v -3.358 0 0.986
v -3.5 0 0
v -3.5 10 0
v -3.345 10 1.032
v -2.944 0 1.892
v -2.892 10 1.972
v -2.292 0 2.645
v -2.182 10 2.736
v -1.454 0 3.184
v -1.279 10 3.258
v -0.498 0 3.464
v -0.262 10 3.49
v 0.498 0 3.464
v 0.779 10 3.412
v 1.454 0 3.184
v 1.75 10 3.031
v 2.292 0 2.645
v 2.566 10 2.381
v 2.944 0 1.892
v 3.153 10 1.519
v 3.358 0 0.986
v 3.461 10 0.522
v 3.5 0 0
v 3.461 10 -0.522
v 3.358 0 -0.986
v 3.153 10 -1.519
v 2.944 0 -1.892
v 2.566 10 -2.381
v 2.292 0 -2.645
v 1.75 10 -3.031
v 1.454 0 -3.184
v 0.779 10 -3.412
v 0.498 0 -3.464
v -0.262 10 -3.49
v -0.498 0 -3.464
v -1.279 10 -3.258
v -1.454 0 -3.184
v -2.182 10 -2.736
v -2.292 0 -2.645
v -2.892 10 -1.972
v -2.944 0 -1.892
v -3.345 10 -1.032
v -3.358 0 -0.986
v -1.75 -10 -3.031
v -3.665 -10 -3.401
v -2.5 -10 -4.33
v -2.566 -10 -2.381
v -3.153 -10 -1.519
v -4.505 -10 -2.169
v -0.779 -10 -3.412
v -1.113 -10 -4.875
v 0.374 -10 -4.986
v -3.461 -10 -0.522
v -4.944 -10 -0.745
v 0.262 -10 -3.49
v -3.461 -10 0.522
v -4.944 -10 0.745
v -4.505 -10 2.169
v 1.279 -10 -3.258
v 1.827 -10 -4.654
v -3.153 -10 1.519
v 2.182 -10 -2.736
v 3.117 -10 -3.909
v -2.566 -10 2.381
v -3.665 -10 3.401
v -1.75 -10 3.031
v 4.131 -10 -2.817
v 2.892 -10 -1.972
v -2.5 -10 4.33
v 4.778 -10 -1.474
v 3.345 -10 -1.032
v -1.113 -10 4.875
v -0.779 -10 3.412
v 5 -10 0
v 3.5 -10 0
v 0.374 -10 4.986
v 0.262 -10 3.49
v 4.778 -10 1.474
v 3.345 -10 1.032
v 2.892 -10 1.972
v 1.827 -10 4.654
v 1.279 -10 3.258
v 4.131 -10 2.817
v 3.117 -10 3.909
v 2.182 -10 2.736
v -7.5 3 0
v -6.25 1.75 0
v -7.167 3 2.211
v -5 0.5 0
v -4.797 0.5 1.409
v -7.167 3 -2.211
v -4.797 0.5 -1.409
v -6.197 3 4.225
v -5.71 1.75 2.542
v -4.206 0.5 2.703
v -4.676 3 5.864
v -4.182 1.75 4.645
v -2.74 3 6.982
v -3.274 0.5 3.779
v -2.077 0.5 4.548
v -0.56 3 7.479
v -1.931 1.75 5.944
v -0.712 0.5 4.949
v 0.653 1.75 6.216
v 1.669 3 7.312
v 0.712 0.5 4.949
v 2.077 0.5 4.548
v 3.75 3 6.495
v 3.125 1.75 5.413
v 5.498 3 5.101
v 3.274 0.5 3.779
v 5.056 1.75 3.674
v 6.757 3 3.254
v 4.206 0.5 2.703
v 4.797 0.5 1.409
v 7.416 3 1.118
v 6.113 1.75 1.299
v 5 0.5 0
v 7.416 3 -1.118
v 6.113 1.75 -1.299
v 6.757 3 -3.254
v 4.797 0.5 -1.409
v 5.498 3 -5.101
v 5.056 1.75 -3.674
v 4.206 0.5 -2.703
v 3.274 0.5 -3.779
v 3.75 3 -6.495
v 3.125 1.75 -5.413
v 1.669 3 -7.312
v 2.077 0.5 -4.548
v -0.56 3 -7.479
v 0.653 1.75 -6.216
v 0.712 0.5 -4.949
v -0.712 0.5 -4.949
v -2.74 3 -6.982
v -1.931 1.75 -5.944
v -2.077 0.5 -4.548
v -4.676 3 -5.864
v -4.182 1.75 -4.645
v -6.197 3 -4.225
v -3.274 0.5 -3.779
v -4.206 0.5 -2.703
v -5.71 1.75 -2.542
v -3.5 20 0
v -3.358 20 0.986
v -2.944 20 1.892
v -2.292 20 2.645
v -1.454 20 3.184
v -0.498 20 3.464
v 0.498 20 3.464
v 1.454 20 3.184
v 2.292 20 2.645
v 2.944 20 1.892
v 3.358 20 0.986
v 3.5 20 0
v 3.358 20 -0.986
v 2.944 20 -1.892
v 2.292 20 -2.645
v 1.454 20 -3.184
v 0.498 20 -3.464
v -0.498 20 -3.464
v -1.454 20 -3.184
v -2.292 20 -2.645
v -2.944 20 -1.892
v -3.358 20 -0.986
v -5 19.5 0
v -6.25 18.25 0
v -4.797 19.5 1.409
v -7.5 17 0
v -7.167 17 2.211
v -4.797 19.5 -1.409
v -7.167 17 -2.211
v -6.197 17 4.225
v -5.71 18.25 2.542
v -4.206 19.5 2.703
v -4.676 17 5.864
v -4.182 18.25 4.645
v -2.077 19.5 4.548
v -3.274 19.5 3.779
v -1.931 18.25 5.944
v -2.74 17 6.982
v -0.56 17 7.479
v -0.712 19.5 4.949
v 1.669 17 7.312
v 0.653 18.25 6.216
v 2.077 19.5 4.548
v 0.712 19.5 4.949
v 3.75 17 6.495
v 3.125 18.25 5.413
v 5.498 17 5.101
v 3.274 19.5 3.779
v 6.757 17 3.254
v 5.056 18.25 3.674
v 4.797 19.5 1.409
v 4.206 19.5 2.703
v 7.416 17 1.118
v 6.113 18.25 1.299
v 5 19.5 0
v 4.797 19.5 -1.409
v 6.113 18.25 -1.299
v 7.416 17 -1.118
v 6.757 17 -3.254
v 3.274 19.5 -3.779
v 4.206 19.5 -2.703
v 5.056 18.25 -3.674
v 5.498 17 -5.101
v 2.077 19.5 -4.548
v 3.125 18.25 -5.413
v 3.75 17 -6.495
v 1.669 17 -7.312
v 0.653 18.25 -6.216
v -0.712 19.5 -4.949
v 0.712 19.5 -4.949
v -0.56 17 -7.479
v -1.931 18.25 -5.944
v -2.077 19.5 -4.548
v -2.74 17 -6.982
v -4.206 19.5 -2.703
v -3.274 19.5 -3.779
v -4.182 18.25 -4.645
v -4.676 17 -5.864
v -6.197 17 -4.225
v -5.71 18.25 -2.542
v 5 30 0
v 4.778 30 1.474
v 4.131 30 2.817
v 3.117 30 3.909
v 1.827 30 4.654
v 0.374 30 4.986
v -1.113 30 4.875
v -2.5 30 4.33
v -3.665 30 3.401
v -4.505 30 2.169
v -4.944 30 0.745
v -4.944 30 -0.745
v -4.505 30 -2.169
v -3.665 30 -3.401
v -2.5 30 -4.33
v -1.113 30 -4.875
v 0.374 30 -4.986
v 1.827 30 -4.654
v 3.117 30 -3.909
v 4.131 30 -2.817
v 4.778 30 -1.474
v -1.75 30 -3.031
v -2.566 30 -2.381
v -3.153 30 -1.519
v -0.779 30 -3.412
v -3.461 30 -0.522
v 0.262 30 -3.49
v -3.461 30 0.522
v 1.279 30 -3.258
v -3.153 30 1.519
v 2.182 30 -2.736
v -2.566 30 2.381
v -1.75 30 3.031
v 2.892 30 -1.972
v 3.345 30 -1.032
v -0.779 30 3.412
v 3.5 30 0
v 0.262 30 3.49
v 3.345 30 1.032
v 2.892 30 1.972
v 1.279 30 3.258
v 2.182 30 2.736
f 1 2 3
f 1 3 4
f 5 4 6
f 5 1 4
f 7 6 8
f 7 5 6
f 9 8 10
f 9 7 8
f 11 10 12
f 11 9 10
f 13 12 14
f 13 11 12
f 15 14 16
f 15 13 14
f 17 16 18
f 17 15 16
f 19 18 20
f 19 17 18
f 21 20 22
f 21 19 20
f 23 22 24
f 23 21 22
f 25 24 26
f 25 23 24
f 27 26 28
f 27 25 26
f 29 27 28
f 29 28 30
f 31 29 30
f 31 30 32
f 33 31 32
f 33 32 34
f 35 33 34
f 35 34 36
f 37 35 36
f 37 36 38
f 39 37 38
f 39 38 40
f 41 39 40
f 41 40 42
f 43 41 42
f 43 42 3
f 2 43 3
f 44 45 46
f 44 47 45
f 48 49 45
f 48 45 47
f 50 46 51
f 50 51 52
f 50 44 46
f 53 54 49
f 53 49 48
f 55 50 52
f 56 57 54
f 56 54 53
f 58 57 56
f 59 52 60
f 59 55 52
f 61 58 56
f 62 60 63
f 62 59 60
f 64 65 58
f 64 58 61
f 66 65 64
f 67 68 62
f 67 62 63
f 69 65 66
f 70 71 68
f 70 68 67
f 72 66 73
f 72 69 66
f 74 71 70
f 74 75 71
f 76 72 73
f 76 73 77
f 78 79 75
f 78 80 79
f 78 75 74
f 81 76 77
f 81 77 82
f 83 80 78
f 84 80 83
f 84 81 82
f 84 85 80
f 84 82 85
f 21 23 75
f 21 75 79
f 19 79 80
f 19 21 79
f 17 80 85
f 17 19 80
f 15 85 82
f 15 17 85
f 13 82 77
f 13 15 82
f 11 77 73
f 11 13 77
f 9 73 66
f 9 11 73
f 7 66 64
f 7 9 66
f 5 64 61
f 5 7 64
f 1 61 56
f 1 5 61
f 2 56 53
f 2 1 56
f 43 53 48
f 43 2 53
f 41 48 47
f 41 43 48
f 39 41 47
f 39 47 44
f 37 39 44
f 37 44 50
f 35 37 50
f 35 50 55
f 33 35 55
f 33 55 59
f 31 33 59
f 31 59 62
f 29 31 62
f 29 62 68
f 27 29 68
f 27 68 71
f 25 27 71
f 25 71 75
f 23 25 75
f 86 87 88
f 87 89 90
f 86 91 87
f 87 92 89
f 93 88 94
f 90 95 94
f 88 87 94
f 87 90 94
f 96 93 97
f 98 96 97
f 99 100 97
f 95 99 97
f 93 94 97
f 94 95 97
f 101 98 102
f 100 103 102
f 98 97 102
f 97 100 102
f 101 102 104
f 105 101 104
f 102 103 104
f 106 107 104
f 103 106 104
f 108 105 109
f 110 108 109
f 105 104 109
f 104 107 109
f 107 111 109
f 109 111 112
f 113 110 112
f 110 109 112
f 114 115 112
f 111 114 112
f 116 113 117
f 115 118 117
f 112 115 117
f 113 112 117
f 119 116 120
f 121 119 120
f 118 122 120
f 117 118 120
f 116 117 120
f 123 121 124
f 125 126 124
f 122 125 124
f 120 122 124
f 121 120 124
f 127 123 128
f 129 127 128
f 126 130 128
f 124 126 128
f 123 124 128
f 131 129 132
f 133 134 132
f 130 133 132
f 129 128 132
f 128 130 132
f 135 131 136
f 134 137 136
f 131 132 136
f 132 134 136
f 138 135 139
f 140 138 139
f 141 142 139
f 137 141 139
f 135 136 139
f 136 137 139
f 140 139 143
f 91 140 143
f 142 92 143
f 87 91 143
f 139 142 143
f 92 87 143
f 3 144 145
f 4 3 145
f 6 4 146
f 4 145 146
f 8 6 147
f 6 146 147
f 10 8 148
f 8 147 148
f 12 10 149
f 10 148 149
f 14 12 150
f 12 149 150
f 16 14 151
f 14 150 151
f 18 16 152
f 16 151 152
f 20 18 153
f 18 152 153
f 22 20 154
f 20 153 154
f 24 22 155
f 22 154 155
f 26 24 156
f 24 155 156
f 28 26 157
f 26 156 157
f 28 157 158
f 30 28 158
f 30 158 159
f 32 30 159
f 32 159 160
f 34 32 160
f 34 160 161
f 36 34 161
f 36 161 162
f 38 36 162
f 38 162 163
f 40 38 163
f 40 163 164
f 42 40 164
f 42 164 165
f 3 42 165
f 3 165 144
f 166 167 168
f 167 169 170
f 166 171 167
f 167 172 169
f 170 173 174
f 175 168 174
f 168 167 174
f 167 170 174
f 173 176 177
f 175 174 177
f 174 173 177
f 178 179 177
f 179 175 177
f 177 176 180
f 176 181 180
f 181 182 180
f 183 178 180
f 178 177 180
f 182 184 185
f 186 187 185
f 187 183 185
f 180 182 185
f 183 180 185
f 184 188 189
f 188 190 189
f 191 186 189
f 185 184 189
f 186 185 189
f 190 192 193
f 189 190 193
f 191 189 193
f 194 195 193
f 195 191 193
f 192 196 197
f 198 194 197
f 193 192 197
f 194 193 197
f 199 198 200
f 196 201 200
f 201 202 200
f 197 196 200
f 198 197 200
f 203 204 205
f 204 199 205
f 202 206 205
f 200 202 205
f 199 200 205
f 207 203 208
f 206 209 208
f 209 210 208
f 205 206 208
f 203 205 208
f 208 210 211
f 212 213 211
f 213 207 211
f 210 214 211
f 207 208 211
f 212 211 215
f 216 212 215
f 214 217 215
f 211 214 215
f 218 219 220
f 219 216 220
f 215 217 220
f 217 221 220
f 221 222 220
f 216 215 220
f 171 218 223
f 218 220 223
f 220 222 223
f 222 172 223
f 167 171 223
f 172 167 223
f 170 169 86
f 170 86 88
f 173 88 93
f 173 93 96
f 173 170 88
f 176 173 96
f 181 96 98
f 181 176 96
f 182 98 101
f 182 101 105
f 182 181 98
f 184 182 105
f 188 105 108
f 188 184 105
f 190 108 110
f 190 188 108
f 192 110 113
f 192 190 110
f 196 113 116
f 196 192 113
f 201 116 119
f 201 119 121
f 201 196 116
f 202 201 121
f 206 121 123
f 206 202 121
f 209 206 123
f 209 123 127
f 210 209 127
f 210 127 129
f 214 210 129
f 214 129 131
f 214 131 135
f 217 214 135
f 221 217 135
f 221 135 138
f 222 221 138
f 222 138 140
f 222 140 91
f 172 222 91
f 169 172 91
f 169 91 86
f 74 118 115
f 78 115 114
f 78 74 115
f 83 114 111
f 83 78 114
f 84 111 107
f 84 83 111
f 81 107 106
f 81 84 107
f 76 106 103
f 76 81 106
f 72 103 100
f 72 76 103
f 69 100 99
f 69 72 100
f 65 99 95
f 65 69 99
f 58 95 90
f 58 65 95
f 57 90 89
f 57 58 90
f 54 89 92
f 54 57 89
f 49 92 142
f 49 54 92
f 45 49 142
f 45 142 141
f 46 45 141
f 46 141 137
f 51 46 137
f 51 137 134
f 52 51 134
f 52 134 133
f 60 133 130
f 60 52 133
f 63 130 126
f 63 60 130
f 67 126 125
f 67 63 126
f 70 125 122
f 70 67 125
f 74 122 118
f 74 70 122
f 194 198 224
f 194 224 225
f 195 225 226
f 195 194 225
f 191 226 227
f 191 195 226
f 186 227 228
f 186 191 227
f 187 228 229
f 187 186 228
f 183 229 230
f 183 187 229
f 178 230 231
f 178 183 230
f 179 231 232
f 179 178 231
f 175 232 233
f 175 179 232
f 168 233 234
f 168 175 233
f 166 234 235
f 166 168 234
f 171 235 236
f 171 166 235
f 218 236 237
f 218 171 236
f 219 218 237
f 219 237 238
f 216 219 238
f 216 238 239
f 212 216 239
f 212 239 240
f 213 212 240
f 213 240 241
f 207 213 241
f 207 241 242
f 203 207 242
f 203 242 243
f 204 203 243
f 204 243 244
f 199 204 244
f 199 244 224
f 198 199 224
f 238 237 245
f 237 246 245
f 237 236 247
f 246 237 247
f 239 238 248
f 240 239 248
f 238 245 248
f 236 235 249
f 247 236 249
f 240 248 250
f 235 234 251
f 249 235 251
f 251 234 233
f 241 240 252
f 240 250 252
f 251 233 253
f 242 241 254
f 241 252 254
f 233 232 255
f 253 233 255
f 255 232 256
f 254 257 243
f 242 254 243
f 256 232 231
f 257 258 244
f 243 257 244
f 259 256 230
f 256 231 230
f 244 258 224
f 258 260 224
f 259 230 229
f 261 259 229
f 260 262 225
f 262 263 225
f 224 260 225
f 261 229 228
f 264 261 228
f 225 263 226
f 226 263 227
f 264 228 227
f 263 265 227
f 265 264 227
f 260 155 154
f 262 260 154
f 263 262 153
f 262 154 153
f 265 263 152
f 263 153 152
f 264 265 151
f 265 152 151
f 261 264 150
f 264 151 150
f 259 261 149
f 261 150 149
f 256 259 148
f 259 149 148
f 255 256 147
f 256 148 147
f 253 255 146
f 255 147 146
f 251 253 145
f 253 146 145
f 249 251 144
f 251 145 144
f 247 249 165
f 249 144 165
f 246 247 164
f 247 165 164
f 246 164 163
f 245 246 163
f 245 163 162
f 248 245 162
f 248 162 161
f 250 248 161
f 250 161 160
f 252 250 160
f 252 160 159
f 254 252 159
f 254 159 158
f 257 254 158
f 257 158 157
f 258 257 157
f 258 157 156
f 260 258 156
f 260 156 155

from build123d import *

# Parameters (mm, degrees)
F0_R         = 5
F0_R_2       = 3.5
F1_DEPTH     = 10
F2_R         = 7.5
F2_R_2       = 5
F2_R_3       = 3.5
F3_DEPTH     = 10
F5_S5_R      = 5
F5_T6_DEPTH  = 12
F5_S11_R     = 5
F5_T12_DEPTH = 12


# Not quite as in the source:
# - a fillet or chamfer that OpenCascade refuses, or shapes differently, is made with other operations: its cross-section is extruded or revolved along the edge and cut away or added


with BuildPart() as f1:
    # F0 (on Front) → F1 (new body)
    with BuildSketch(Plane.XZ):
        Circle(F0_R)
        Circle(F0_R_2, mode=Mode.SUBTRACT)
    extrude(amount=F1_DEPTH)

    # F2 (on face) → F3 (join)
    with BuildSketch(Plane(origin=(0, 0, 0), x_dir=(-1, 0, 0), z_dir=(0, 1, 0))):
        Circle(F2_R)
        Circle(F2_R_2, mode=Mode.SUBTRACT)
        Circle(F2_R_2)
        Circle(F2_R_3, mode=Mode.SUBTRACT)
    extrude(amount=F3_DEPTH)

    # F4: F1 across face


with BuildPart() as f1_1:
    add(f1.part)
    add(f1.part.mirror(Plane(origin=(0, 10, 0), x_dir=(-1, 0, 0), z_dir=(0, 1, 0))))

    # F5: chamfer of 3 on 2 edges, made by hand


with BuildPart() as f5_tool2:
    # F5_s3 → F5_t4 (revolve)
    with BuildSketch(Plane.XY):
        Polygon((-4.5, 20), (-7.5, 17), (-7.5, 20), align=None)
    revolve(axis=Axis((0, 20, 0), (0, 1, 0)))

    # F5_s5 → F5_t6 (cut, symmetric)
    with BuildSketch(Plane.XZ.offset(-18.5)):
        Circle(F5_S5_R)
    extrude(amount=F5_T6_DEPTH, both=True, mode=Mode.SUBTRACT)


with BuildPart() as f1_2:
    add(f1_1.part)

    # F5_t1: cut F5_tool2
    add(f5_tool2.part, mode=Mode.SUBTRACT)


with BuildPart() as f5_tool8:
    # F5_s9 → F5_t10 (revolve)
    with BuildSketch(Plane.XY):
        Polygon((-7.5, 3), (-4.5, 0), (-7.5, 0), align=None)
    revolve(axis=Axis((0, 0, 0), (0, 1, 0)))

    # F5_s11 → F5_t12 (cut, symmetric)
    with BuildSketch(Plane.XZ.offset(-1.5)):
        Circle(F5_S11_R)
    extrude(amount=F5_T12_DEPTH, both=True, mode=Mode.SUBTRACT)


with BuildPart() as f1_3:
    add(f1_2.part)

    # F5_t7: cut F5_tool8
    add(f5_tool8.part, mode=Mode.SUBTRACT)


solid = f1_3.part
